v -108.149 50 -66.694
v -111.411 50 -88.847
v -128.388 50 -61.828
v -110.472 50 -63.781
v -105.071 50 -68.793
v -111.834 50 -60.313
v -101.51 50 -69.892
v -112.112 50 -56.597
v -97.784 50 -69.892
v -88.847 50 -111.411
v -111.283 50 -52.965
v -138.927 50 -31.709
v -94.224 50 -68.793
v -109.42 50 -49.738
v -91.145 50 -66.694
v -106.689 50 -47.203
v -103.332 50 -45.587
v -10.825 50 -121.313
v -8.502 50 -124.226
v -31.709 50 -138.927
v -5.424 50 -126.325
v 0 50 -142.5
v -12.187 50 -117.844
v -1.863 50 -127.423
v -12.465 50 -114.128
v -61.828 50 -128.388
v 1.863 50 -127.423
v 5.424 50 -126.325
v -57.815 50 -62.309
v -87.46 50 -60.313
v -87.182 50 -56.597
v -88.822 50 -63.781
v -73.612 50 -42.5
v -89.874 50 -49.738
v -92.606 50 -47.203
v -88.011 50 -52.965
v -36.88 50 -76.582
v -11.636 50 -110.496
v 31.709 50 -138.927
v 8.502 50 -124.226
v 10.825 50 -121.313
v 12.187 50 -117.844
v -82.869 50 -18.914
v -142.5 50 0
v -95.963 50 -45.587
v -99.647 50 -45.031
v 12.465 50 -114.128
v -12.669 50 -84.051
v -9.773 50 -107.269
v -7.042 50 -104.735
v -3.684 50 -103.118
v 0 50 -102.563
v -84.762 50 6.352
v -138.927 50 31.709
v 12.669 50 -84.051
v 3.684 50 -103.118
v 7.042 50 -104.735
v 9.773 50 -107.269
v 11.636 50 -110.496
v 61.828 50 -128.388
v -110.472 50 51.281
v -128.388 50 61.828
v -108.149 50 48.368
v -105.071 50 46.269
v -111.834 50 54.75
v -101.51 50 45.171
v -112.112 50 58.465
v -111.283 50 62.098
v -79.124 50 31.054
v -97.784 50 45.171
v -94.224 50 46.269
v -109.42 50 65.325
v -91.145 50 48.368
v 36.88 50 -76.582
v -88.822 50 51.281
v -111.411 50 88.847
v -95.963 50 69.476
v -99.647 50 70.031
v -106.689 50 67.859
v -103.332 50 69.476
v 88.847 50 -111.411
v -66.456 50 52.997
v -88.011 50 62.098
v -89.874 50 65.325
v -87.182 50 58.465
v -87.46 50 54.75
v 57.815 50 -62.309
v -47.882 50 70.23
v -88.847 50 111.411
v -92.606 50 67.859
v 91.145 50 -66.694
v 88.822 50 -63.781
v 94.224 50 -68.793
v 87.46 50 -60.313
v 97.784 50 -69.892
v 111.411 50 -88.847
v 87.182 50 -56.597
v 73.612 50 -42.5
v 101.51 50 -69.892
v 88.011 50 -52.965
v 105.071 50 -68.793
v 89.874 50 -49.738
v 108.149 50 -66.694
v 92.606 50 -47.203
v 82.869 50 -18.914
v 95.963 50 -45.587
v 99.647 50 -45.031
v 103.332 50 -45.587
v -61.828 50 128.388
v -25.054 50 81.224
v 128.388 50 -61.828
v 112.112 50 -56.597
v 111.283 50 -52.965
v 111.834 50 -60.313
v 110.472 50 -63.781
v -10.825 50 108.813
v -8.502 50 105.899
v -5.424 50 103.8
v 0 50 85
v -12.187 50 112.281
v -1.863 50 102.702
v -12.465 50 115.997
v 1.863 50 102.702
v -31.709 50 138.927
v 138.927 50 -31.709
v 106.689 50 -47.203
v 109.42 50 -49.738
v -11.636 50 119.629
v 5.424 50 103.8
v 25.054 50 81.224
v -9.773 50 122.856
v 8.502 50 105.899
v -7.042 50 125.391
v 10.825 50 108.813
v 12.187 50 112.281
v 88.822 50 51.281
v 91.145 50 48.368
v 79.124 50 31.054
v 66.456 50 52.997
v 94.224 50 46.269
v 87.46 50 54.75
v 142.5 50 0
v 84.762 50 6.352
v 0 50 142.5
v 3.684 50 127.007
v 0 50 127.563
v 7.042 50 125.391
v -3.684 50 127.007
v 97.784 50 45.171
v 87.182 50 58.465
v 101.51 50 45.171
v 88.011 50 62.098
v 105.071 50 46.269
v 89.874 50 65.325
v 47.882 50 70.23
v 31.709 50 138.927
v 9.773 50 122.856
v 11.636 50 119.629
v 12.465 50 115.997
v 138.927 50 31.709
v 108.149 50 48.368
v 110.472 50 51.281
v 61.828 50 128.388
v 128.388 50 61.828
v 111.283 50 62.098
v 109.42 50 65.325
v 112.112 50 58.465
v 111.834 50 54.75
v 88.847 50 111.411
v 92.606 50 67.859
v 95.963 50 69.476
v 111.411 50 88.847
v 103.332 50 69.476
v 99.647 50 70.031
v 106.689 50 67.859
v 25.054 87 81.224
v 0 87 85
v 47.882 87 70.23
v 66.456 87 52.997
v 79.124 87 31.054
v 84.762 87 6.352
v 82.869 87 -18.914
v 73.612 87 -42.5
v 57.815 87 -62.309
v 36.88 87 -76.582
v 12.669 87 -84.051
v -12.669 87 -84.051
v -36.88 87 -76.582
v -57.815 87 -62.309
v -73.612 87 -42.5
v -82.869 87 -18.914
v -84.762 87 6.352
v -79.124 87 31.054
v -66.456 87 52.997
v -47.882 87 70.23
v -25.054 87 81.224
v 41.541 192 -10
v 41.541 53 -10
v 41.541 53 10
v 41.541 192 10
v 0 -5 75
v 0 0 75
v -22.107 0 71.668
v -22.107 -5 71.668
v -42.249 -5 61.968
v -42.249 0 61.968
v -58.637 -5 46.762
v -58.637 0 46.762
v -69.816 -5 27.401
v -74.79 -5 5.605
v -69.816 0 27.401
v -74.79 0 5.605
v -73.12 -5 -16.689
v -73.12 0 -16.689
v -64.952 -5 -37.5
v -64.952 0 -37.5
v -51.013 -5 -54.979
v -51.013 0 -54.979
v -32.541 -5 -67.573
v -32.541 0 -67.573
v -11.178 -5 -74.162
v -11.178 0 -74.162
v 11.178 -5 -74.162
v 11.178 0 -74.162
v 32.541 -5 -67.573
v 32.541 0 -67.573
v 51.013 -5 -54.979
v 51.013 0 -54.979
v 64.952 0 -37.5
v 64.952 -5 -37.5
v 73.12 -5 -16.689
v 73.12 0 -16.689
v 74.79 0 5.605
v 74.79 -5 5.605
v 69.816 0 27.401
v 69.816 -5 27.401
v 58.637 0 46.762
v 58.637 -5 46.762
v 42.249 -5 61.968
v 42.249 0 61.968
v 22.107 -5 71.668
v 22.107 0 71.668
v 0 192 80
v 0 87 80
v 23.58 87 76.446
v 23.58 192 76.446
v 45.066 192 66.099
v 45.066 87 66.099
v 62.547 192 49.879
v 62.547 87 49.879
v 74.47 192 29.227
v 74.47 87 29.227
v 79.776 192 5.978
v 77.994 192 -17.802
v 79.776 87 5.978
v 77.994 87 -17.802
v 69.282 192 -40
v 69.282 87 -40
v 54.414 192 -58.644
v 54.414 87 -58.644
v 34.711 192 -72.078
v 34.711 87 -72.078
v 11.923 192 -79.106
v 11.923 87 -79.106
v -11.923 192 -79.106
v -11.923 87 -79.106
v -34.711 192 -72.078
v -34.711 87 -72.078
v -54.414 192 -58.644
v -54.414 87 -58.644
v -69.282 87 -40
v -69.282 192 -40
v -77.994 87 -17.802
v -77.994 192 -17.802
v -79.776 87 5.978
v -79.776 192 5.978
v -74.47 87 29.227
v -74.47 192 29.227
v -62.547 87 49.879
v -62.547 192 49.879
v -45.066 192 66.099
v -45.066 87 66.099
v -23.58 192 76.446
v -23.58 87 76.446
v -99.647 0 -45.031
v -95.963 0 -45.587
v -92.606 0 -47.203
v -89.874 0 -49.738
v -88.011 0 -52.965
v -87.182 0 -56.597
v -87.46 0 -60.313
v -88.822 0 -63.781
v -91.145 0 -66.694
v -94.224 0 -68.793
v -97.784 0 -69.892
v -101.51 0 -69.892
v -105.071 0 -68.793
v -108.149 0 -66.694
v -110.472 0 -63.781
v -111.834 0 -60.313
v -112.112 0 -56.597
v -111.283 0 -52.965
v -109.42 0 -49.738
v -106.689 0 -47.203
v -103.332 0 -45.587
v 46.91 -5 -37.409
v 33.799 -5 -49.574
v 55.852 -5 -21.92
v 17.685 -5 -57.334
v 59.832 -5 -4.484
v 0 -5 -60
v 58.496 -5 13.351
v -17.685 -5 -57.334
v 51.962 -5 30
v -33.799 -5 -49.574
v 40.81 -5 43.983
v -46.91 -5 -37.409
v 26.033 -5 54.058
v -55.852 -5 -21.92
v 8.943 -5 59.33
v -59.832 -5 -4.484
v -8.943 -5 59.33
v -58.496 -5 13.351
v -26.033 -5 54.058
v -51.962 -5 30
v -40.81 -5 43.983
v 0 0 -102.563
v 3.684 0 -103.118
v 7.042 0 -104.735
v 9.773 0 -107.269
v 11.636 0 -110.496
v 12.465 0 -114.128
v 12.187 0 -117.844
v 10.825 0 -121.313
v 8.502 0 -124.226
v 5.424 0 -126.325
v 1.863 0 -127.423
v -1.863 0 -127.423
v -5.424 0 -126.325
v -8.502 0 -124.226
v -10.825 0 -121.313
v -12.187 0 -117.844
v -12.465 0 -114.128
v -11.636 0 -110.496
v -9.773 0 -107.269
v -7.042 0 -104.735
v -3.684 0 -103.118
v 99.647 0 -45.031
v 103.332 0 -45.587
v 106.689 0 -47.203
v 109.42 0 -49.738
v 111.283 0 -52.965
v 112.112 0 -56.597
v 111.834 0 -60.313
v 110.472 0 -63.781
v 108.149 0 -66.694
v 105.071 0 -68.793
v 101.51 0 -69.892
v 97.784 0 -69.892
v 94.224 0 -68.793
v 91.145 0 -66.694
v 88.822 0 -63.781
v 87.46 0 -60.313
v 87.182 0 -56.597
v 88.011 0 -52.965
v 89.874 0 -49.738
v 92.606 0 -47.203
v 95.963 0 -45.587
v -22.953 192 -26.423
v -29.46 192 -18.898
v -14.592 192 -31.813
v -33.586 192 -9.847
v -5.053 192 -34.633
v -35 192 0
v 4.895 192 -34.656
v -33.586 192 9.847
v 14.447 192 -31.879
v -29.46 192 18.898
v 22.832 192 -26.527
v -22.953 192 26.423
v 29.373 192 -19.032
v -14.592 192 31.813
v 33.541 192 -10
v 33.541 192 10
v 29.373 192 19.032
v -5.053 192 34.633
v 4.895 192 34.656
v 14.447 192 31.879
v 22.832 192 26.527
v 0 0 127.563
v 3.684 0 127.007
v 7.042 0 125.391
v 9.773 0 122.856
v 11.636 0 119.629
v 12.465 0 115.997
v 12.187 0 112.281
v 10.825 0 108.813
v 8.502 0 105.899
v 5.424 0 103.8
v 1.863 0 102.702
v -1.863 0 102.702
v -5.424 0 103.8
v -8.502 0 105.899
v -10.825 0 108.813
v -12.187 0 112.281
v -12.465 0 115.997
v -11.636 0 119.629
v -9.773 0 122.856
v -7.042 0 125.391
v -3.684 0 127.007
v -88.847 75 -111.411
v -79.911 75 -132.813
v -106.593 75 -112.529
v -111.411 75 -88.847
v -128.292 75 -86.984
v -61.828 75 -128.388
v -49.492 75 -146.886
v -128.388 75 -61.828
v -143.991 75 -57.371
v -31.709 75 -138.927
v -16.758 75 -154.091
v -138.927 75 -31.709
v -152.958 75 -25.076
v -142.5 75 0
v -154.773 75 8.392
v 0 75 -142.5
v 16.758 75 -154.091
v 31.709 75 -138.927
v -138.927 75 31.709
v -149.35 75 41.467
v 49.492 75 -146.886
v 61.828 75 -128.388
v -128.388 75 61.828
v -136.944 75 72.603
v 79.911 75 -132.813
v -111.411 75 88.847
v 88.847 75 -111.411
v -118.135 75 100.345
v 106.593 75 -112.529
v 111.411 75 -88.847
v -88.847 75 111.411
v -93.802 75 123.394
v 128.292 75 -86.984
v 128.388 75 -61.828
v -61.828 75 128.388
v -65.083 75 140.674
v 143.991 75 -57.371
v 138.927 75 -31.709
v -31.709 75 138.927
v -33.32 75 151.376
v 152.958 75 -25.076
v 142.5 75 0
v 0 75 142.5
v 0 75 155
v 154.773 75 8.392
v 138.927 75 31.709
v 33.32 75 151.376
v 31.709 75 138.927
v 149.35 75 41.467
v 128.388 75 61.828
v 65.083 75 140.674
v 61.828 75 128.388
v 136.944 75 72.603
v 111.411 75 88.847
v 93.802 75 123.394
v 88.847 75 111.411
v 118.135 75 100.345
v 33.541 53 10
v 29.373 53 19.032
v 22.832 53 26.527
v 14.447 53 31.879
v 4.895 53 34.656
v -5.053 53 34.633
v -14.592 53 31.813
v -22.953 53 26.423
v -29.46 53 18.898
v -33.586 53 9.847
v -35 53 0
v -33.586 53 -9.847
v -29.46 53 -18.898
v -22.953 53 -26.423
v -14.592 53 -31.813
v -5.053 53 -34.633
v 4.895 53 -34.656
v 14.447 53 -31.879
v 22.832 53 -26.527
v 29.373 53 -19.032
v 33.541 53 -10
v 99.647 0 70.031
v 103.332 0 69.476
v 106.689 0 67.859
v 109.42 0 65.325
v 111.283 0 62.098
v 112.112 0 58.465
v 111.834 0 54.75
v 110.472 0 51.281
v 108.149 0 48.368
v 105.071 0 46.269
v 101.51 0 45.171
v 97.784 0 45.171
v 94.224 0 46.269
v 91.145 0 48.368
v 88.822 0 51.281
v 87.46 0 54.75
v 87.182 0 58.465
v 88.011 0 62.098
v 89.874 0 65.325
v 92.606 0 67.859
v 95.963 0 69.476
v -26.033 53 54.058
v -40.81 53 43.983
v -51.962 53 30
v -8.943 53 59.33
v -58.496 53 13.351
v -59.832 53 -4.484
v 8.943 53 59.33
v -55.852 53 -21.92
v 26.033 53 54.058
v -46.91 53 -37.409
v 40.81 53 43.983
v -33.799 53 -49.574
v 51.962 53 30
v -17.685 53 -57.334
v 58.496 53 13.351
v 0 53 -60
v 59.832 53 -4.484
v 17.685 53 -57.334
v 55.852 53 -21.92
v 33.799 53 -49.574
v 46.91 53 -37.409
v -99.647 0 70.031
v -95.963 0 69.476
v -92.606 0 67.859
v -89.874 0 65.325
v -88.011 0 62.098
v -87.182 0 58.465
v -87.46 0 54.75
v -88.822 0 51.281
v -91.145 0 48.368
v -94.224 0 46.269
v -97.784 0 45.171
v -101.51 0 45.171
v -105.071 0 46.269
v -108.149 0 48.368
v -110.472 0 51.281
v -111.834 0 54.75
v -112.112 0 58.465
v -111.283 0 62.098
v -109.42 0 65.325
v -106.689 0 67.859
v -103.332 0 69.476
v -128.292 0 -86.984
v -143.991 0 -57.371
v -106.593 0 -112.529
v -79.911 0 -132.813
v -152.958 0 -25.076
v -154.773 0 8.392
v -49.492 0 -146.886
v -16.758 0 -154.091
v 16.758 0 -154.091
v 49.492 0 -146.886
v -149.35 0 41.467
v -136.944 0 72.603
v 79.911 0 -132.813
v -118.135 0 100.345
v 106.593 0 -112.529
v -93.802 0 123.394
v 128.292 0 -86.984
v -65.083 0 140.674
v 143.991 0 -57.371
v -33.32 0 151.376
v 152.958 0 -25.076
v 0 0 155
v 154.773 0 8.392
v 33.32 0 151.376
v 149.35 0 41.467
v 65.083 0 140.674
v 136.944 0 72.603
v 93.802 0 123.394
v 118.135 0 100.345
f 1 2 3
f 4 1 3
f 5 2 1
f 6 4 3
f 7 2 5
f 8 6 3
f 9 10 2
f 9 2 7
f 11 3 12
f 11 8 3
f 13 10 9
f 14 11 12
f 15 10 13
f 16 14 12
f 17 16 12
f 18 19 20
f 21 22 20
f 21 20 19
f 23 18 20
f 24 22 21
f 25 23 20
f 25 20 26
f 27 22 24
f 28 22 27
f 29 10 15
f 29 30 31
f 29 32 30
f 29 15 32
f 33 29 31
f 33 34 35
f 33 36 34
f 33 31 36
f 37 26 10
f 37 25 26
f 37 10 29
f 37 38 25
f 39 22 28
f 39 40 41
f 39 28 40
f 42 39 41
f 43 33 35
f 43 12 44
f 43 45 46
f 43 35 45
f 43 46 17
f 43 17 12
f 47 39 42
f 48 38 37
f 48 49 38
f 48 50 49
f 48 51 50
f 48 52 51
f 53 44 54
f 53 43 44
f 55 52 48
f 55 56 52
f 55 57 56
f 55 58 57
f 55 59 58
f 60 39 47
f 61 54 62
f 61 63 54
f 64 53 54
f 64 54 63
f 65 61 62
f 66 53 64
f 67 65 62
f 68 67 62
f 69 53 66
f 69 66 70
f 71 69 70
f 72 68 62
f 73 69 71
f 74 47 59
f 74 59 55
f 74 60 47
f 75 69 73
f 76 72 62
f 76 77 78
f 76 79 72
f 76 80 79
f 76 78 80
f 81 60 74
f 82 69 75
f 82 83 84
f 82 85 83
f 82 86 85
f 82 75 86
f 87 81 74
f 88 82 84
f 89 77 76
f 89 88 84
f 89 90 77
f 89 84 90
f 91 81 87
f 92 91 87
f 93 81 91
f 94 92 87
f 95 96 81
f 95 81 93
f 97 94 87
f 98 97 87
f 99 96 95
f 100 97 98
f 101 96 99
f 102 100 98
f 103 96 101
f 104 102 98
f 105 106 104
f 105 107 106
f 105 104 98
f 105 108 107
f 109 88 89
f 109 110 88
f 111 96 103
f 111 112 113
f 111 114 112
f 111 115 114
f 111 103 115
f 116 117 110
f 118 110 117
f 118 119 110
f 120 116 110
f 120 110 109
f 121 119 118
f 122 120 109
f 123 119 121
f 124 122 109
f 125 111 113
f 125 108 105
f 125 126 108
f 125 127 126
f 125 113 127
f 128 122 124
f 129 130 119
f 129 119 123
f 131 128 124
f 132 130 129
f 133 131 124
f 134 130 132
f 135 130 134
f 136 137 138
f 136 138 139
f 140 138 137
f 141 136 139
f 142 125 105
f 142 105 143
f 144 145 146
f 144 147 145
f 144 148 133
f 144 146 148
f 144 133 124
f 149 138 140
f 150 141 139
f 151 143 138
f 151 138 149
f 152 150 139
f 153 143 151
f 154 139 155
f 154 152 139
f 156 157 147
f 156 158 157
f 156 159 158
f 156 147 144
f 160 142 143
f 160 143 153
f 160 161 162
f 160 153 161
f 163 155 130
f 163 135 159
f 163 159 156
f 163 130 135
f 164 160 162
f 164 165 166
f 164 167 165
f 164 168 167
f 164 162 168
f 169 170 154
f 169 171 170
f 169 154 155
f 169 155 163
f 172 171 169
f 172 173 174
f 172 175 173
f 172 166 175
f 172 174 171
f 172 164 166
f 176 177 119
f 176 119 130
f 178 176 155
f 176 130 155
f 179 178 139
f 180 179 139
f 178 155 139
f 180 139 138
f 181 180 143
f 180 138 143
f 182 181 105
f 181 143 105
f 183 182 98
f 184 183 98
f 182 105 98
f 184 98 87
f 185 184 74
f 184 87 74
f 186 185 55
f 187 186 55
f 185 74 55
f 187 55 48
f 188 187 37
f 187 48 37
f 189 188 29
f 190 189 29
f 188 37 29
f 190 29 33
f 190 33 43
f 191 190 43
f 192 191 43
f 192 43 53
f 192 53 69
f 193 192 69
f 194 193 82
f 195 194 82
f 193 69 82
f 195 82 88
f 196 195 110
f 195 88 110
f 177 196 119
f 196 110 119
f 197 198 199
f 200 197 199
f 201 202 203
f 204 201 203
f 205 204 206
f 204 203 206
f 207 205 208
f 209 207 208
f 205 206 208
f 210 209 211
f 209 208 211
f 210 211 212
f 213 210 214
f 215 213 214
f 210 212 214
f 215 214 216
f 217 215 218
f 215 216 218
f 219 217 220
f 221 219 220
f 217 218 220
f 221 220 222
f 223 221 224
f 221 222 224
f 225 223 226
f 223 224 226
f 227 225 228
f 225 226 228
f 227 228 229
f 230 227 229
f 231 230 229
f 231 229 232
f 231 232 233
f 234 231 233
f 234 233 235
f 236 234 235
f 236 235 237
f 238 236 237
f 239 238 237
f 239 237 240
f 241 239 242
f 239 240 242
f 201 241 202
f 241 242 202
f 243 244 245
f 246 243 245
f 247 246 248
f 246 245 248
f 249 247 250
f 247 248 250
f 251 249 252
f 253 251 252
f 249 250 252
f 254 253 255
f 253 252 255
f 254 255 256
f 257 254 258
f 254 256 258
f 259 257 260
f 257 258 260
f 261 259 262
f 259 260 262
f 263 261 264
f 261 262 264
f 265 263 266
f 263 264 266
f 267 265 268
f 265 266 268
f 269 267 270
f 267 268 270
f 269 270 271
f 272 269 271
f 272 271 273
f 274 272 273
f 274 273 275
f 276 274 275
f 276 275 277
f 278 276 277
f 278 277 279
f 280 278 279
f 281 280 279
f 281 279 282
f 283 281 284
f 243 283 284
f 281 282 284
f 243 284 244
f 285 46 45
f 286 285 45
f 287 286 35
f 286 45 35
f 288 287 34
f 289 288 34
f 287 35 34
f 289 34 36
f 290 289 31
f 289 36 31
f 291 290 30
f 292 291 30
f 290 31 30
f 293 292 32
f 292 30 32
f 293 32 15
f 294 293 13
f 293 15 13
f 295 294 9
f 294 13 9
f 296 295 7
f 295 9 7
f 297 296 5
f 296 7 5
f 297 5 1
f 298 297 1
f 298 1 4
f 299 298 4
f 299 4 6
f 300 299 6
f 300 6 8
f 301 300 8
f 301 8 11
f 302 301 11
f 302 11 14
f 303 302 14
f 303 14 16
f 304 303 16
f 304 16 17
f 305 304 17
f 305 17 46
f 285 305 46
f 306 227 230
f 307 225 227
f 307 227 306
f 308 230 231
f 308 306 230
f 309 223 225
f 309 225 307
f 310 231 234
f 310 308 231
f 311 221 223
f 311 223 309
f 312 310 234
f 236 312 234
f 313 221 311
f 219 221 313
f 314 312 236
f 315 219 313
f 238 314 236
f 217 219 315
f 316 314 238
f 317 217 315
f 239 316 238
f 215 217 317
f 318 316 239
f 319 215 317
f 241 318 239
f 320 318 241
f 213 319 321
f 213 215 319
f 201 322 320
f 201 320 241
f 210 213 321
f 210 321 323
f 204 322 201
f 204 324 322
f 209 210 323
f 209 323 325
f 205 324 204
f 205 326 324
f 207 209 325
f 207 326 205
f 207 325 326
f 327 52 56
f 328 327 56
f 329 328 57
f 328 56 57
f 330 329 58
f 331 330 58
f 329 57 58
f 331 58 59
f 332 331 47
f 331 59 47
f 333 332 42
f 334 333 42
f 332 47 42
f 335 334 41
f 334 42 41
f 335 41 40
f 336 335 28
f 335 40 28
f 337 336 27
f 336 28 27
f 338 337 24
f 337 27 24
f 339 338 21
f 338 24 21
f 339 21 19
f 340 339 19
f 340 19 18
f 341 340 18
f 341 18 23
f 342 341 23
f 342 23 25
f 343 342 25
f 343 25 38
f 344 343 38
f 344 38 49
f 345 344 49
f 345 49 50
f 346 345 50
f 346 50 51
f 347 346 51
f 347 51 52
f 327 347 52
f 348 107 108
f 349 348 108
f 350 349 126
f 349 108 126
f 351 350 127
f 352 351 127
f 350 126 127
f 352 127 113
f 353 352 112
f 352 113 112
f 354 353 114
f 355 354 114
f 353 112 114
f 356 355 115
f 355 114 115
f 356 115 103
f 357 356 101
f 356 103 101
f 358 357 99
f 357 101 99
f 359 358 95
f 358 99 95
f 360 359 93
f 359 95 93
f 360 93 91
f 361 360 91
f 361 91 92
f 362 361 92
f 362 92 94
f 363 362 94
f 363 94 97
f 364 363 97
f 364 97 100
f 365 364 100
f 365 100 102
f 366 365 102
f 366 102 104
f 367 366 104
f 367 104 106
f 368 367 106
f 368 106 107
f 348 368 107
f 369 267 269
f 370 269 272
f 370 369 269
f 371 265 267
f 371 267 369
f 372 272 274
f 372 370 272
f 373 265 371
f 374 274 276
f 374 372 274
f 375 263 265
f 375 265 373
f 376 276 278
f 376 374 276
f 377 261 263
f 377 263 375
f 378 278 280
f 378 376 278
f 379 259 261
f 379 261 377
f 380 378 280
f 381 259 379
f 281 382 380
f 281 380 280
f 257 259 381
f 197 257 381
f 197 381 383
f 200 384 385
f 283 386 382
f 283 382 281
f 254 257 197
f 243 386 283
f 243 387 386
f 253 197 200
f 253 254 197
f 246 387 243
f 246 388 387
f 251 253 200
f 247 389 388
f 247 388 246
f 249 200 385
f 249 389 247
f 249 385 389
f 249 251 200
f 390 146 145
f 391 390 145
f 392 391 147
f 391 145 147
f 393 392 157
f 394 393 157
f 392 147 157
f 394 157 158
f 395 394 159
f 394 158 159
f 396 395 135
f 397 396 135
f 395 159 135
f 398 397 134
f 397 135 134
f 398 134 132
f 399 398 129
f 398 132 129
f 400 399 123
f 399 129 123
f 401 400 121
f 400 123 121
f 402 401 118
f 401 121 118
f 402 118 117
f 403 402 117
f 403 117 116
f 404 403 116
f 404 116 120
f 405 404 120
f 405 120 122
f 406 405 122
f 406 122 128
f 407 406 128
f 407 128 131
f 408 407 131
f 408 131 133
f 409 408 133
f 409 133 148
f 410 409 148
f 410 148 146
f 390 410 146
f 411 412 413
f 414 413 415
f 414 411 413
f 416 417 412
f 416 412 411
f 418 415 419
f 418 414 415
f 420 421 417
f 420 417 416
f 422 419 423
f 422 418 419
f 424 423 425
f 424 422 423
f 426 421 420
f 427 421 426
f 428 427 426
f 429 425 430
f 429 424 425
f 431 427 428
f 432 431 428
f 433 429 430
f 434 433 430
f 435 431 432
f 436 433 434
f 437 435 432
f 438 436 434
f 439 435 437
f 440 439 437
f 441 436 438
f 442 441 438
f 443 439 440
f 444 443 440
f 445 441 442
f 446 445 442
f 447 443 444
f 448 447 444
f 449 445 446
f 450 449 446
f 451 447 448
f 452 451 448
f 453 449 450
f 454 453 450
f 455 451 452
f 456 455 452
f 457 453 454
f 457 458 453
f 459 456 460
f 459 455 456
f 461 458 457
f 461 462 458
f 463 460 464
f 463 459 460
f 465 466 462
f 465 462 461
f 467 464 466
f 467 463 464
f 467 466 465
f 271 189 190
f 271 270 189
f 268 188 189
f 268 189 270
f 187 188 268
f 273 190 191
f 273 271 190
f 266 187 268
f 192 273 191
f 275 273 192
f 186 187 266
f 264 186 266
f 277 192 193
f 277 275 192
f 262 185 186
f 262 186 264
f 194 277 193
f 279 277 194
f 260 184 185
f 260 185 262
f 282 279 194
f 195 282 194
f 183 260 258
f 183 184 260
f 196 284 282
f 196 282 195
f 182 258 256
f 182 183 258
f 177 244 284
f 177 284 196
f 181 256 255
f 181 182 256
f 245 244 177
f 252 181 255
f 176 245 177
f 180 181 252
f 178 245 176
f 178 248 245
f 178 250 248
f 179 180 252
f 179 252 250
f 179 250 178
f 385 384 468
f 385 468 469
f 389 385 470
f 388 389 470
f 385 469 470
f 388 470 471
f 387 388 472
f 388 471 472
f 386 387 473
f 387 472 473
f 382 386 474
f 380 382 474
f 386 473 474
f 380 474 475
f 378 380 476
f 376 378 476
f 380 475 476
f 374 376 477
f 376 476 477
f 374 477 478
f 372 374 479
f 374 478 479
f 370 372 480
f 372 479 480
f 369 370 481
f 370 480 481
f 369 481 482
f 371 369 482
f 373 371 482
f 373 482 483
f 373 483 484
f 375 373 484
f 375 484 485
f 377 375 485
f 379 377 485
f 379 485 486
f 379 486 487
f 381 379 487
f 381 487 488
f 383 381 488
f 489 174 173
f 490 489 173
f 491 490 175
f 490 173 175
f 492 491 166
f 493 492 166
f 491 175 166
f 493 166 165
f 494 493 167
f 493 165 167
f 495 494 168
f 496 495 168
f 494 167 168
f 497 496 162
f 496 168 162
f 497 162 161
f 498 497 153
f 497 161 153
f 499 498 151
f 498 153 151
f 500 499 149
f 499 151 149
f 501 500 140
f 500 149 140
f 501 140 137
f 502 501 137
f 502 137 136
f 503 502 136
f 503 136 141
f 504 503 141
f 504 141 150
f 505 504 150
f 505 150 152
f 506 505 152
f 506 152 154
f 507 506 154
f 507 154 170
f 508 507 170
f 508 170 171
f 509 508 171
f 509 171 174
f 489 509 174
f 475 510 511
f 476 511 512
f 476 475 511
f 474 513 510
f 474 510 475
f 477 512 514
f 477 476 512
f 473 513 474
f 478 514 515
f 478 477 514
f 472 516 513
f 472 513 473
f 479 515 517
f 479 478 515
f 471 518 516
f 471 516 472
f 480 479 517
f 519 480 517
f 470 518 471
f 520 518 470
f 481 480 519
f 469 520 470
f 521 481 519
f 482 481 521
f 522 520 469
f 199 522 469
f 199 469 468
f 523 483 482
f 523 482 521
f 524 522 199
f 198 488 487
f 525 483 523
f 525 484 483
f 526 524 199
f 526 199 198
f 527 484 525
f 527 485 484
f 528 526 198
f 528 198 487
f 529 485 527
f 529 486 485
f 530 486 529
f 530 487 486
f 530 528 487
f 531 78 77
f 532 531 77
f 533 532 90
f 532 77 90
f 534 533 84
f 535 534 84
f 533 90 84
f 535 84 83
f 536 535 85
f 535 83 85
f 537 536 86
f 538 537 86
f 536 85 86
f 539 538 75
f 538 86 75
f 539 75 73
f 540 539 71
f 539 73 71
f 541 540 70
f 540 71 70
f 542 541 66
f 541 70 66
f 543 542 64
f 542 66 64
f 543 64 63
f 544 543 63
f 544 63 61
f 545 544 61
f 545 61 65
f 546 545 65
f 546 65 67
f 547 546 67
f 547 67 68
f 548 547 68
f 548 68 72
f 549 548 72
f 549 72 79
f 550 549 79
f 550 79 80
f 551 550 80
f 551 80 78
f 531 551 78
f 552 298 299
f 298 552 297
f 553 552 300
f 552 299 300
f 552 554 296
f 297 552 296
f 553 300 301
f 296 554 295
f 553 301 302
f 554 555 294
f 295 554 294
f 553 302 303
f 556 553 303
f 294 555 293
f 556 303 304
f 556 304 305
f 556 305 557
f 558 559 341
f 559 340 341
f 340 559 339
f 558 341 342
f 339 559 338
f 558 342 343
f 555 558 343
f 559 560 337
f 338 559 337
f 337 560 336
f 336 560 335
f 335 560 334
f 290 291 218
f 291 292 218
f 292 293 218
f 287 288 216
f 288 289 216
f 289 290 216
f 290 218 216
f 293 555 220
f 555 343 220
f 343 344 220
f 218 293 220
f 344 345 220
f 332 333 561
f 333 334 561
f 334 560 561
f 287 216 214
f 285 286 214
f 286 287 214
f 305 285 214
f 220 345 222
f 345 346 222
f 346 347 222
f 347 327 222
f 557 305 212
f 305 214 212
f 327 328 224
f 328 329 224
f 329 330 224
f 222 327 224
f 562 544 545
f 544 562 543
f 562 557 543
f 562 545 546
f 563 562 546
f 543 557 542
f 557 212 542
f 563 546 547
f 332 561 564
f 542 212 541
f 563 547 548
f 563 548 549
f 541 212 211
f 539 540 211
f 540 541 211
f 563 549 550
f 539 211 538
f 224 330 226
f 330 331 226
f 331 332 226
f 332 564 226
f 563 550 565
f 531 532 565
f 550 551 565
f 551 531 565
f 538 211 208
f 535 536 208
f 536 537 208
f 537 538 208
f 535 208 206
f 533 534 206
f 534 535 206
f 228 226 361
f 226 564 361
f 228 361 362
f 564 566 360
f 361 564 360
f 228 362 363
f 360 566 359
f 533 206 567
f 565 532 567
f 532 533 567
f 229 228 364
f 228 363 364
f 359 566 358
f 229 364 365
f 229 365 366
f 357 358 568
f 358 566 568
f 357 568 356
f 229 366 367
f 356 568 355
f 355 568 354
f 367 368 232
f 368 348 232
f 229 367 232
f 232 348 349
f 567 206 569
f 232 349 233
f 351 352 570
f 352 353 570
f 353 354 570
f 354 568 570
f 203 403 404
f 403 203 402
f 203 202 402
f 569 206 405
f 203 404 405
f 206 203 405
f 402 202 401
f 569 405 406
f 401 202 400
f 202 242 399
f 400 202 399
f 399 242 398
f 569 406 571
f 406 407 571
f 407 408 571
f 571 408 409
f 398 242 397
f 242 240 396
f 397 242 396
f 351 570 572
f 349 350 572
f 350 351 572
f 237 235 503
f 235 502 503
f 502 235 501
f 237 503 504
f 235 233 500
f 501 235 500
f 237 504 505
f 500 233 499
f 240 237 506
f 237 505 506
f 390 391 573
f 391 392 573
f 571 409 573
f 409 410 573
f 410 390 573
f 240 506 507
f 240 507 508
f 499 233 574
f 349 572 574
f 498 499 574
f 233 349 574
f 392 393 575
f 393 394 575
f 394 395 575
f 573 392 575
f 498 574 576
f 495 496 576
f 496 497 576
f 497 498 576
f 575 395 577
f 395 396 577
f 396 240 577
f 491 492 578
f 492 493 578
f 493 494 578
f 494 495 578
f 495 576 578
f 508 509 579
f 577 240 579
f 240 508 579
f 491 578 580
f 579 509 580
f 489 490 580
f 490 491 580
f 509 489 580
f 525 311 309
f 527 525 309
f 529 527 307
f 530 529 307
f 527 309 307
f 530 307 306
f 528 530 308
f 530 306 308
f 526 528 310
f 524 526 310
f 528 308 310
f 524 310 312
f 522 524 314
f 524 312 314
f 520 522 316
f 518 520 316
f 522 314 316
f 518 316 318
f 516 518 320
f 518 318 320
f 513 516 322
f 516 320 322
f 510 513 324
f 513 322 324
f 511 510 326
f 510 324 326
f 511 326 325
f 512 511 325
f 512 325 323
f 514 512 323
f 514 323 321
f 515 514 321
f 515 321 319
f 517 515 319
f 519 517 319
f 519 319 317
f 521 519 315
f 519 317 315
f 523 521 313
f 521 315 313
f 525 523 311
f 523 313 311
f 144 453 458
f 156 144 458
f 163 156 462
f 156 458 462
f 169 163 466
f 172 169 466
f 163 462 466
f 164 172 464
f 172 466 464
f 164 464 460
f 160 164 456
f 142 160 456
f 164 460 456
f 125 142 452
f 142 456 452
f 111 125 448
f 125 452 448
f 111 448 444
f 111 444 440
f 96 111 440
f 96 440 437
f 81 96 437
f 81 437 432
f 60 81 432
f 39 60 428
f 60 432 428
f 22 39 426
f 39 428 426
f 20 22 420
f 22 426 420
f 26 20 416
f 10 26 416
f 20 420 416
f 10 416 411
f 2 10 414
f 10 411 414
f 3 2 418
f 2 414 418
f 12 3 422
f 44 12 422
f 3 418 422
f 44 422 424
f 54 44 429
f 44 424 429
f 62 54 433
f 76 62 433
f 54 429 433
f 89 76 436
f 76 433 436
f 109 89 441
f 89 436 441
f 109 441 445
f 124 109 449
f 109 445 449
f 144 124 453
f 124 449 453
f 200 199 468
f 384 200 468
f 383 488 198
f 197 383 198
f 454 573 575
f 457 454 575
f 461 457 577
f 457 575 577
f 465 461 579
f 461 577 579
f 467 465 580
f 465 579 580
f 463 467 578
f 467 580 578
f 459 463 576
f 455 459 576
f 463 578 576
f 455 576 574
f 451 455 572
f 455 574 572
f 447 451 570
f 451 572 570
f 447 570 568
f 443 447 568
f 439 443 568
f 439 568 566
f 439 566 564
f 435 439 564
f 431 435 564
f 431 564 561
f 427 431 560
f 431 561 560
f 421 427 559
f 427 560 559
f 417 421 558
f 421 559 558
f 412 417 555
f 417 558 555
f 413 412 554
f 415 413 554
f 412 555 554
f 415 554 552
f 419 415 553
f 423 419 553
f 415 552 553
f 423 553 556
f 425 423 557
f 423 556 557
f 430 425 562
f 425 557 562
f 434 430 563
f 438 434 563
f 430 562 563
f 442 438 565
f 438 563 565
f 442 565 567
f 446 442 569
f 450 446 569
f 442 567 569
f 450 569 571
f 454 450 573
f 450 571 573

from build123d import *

# Parameters (mm, degrees)
SKETCH1_R               = 155
BOSS_EXTRUDE1_DEPTH     = 75
SKETCH2_R               = 142.5
CUT_EXTRUDE1_DEPTH      = 25
SKETCH3_R               = 85
BOSS_EXTRUDE2_DEPTH     = 37
SKETCH4_R               = 80
BOSS_EXTRUDE3_DEPTH     = 105
CUT_EXTRUDE2_DEPTH      = 292.400068634
CUT_EXTRUDE2_DEPTH_BACK = 292.400068634
SKETCH6_R               = 75
BOSS_EXTRUDE4_DEPTH     = 5
SKETCH7_R               = 60
CUT_EXTRUDE3_DEPTH      = 58
SKETCH8_R               = 12.5
CUT_EXTRUDE4_DEPTH      = 262.178100154


with BuildPart() as part:
    # Sketch1 → Boss-Extrude1 (new body)
    with BuildSketch(Plane(origin=(0, 0, 0), x_dir=(1, 0, 0), z_dir=(0, 1, 0))):
        with Locations(Location((0, 0, 0), (0, 0, 270))):
            Circle(SKETCH1_R)
    extrude(amount=BOSS_EXTRUDE1_DEPTH)

    # Sketch2 → Cut-Extrude1 (cut)
    with BuildSketch(Plane(origin=(0, 75, 0), x_dir=(1, 0, 0), z_dir=(0, 1, 0))):
        with Locations(Location((0, 0, 0), (0, 0, 270))):
            Circle(SKETCH2_R)
    extrude(amount=-CUT_EXTRUDE1_DEPTH, mode=Mode.SUBTRACT)

    # Sketch3 → Boss-Extrude2 (add)
    with BuildSketch(Plane(origin=(0, 50, 0), x_dir=(1, 0, 0), z_dir=(0, 1, 0))):
        with Locations(Location((0, 0, 0), (0, 0, 270))):
            Circle(SKETCH3_R)
    extrude(amount=BOSS_EXTRUDE2_DEPTH)

    # Sketch4 → Boss-Extrude3 (add)
    with BuildSketch(Plane(origin=(0, 87, 0), x_dir=(1, 0, 0), z_dir=(0, 1, 0))):
        with Locations(Location((0, 0, 0), (0, 0, 270))):
            Circle(SKETCH4_R)
    extrude(amount=BOSS_EXTRUDE3_DEPTH)

    # Sketch5 → Cut-Extrude2 (cut, two sides: drawn at the far end of the back side and taken through both)
    with BuildSketch(Plane(origin=(0, 192, 0), x_dir=(1, 0, 0), z_dir=(0, 1, 0)).offset(-CUT_EXTRUDE2_DEPTH_BACK)):
        with BuildLine():
            Line((33.541019662, 10), (41.541019662, 10))
            Line((41.541019662, 10), (41.541019662, -10))
            Line((41.541019662, -10), (33.541019662, -10))
            ThreePointArc((33.541019662, -10), (-35, 0), (33.541019662, 10))
        make_face()
    extrude(amount=CUT_EXTRUDE2_DEPTH + CUT_EXTRUDE2_DEPTH_BACK, mode=Mode.SUBTRACT)

    # Sketch6 → Boss-Extrude4 (add)
    with BuildSketch(Plane.XZ):
        with Locations(Location((0, 0, 0), (0, 0, 90))):
            Circle(SKETCH6_R)
    extrude(amount=BOSS_EXTRUDE4_DEPTH)

    # Sketch7 → Cut-Extrude3 (cut)
    with BuildSketch(Plane.XZ.offset(5)):
        with Locations(Location((0, 0, 0), (0, 0, 270))):
            Circle(SKETCH7_R)
    extrude(amount=-CUT_EXTRUDE3_DEPTH, mode=Mode.SUBTRACT)

    # Sketch8 → Cut-Extrude4 (cut, through all)
    with BuildSketch(Plane(origin=(0, 50, 0), x_dir=(1, 0, 0), z_dir=(0, 1, 0))):
        with Locations(Location((0, 115.062551677, 0), (0, 0, 270))):
            Circle(SKETCH8_R)
        with Locations(Location((99.647092776, 57.531275838, 0), (0, 0, 270))):
            Circle(SKETCH8_R)
        with Locations(Location((99.647092776, -57.531275838, 0), (0, 0, 270))):
            Circle(SKETCH8_R)
        with Locations(Location((0, -115.062551677, 0), (0, 0, 270))):
            Circle(SKETCH8_R)
        with Locations(Location((-99.647092776, -57.531275838, 0), (0, 0, 270))):
            Circle(SKETCH8_R)
        with Locations(Location((-99.647092776, 57.531275838, 0), (0, 0, 270))):
            Circle(SKETCH8_R)
    extrude(amount=-CUT_EXTRUDE4_DEPTH, mode=Mode.SUBTRACT)


solid = part.part
